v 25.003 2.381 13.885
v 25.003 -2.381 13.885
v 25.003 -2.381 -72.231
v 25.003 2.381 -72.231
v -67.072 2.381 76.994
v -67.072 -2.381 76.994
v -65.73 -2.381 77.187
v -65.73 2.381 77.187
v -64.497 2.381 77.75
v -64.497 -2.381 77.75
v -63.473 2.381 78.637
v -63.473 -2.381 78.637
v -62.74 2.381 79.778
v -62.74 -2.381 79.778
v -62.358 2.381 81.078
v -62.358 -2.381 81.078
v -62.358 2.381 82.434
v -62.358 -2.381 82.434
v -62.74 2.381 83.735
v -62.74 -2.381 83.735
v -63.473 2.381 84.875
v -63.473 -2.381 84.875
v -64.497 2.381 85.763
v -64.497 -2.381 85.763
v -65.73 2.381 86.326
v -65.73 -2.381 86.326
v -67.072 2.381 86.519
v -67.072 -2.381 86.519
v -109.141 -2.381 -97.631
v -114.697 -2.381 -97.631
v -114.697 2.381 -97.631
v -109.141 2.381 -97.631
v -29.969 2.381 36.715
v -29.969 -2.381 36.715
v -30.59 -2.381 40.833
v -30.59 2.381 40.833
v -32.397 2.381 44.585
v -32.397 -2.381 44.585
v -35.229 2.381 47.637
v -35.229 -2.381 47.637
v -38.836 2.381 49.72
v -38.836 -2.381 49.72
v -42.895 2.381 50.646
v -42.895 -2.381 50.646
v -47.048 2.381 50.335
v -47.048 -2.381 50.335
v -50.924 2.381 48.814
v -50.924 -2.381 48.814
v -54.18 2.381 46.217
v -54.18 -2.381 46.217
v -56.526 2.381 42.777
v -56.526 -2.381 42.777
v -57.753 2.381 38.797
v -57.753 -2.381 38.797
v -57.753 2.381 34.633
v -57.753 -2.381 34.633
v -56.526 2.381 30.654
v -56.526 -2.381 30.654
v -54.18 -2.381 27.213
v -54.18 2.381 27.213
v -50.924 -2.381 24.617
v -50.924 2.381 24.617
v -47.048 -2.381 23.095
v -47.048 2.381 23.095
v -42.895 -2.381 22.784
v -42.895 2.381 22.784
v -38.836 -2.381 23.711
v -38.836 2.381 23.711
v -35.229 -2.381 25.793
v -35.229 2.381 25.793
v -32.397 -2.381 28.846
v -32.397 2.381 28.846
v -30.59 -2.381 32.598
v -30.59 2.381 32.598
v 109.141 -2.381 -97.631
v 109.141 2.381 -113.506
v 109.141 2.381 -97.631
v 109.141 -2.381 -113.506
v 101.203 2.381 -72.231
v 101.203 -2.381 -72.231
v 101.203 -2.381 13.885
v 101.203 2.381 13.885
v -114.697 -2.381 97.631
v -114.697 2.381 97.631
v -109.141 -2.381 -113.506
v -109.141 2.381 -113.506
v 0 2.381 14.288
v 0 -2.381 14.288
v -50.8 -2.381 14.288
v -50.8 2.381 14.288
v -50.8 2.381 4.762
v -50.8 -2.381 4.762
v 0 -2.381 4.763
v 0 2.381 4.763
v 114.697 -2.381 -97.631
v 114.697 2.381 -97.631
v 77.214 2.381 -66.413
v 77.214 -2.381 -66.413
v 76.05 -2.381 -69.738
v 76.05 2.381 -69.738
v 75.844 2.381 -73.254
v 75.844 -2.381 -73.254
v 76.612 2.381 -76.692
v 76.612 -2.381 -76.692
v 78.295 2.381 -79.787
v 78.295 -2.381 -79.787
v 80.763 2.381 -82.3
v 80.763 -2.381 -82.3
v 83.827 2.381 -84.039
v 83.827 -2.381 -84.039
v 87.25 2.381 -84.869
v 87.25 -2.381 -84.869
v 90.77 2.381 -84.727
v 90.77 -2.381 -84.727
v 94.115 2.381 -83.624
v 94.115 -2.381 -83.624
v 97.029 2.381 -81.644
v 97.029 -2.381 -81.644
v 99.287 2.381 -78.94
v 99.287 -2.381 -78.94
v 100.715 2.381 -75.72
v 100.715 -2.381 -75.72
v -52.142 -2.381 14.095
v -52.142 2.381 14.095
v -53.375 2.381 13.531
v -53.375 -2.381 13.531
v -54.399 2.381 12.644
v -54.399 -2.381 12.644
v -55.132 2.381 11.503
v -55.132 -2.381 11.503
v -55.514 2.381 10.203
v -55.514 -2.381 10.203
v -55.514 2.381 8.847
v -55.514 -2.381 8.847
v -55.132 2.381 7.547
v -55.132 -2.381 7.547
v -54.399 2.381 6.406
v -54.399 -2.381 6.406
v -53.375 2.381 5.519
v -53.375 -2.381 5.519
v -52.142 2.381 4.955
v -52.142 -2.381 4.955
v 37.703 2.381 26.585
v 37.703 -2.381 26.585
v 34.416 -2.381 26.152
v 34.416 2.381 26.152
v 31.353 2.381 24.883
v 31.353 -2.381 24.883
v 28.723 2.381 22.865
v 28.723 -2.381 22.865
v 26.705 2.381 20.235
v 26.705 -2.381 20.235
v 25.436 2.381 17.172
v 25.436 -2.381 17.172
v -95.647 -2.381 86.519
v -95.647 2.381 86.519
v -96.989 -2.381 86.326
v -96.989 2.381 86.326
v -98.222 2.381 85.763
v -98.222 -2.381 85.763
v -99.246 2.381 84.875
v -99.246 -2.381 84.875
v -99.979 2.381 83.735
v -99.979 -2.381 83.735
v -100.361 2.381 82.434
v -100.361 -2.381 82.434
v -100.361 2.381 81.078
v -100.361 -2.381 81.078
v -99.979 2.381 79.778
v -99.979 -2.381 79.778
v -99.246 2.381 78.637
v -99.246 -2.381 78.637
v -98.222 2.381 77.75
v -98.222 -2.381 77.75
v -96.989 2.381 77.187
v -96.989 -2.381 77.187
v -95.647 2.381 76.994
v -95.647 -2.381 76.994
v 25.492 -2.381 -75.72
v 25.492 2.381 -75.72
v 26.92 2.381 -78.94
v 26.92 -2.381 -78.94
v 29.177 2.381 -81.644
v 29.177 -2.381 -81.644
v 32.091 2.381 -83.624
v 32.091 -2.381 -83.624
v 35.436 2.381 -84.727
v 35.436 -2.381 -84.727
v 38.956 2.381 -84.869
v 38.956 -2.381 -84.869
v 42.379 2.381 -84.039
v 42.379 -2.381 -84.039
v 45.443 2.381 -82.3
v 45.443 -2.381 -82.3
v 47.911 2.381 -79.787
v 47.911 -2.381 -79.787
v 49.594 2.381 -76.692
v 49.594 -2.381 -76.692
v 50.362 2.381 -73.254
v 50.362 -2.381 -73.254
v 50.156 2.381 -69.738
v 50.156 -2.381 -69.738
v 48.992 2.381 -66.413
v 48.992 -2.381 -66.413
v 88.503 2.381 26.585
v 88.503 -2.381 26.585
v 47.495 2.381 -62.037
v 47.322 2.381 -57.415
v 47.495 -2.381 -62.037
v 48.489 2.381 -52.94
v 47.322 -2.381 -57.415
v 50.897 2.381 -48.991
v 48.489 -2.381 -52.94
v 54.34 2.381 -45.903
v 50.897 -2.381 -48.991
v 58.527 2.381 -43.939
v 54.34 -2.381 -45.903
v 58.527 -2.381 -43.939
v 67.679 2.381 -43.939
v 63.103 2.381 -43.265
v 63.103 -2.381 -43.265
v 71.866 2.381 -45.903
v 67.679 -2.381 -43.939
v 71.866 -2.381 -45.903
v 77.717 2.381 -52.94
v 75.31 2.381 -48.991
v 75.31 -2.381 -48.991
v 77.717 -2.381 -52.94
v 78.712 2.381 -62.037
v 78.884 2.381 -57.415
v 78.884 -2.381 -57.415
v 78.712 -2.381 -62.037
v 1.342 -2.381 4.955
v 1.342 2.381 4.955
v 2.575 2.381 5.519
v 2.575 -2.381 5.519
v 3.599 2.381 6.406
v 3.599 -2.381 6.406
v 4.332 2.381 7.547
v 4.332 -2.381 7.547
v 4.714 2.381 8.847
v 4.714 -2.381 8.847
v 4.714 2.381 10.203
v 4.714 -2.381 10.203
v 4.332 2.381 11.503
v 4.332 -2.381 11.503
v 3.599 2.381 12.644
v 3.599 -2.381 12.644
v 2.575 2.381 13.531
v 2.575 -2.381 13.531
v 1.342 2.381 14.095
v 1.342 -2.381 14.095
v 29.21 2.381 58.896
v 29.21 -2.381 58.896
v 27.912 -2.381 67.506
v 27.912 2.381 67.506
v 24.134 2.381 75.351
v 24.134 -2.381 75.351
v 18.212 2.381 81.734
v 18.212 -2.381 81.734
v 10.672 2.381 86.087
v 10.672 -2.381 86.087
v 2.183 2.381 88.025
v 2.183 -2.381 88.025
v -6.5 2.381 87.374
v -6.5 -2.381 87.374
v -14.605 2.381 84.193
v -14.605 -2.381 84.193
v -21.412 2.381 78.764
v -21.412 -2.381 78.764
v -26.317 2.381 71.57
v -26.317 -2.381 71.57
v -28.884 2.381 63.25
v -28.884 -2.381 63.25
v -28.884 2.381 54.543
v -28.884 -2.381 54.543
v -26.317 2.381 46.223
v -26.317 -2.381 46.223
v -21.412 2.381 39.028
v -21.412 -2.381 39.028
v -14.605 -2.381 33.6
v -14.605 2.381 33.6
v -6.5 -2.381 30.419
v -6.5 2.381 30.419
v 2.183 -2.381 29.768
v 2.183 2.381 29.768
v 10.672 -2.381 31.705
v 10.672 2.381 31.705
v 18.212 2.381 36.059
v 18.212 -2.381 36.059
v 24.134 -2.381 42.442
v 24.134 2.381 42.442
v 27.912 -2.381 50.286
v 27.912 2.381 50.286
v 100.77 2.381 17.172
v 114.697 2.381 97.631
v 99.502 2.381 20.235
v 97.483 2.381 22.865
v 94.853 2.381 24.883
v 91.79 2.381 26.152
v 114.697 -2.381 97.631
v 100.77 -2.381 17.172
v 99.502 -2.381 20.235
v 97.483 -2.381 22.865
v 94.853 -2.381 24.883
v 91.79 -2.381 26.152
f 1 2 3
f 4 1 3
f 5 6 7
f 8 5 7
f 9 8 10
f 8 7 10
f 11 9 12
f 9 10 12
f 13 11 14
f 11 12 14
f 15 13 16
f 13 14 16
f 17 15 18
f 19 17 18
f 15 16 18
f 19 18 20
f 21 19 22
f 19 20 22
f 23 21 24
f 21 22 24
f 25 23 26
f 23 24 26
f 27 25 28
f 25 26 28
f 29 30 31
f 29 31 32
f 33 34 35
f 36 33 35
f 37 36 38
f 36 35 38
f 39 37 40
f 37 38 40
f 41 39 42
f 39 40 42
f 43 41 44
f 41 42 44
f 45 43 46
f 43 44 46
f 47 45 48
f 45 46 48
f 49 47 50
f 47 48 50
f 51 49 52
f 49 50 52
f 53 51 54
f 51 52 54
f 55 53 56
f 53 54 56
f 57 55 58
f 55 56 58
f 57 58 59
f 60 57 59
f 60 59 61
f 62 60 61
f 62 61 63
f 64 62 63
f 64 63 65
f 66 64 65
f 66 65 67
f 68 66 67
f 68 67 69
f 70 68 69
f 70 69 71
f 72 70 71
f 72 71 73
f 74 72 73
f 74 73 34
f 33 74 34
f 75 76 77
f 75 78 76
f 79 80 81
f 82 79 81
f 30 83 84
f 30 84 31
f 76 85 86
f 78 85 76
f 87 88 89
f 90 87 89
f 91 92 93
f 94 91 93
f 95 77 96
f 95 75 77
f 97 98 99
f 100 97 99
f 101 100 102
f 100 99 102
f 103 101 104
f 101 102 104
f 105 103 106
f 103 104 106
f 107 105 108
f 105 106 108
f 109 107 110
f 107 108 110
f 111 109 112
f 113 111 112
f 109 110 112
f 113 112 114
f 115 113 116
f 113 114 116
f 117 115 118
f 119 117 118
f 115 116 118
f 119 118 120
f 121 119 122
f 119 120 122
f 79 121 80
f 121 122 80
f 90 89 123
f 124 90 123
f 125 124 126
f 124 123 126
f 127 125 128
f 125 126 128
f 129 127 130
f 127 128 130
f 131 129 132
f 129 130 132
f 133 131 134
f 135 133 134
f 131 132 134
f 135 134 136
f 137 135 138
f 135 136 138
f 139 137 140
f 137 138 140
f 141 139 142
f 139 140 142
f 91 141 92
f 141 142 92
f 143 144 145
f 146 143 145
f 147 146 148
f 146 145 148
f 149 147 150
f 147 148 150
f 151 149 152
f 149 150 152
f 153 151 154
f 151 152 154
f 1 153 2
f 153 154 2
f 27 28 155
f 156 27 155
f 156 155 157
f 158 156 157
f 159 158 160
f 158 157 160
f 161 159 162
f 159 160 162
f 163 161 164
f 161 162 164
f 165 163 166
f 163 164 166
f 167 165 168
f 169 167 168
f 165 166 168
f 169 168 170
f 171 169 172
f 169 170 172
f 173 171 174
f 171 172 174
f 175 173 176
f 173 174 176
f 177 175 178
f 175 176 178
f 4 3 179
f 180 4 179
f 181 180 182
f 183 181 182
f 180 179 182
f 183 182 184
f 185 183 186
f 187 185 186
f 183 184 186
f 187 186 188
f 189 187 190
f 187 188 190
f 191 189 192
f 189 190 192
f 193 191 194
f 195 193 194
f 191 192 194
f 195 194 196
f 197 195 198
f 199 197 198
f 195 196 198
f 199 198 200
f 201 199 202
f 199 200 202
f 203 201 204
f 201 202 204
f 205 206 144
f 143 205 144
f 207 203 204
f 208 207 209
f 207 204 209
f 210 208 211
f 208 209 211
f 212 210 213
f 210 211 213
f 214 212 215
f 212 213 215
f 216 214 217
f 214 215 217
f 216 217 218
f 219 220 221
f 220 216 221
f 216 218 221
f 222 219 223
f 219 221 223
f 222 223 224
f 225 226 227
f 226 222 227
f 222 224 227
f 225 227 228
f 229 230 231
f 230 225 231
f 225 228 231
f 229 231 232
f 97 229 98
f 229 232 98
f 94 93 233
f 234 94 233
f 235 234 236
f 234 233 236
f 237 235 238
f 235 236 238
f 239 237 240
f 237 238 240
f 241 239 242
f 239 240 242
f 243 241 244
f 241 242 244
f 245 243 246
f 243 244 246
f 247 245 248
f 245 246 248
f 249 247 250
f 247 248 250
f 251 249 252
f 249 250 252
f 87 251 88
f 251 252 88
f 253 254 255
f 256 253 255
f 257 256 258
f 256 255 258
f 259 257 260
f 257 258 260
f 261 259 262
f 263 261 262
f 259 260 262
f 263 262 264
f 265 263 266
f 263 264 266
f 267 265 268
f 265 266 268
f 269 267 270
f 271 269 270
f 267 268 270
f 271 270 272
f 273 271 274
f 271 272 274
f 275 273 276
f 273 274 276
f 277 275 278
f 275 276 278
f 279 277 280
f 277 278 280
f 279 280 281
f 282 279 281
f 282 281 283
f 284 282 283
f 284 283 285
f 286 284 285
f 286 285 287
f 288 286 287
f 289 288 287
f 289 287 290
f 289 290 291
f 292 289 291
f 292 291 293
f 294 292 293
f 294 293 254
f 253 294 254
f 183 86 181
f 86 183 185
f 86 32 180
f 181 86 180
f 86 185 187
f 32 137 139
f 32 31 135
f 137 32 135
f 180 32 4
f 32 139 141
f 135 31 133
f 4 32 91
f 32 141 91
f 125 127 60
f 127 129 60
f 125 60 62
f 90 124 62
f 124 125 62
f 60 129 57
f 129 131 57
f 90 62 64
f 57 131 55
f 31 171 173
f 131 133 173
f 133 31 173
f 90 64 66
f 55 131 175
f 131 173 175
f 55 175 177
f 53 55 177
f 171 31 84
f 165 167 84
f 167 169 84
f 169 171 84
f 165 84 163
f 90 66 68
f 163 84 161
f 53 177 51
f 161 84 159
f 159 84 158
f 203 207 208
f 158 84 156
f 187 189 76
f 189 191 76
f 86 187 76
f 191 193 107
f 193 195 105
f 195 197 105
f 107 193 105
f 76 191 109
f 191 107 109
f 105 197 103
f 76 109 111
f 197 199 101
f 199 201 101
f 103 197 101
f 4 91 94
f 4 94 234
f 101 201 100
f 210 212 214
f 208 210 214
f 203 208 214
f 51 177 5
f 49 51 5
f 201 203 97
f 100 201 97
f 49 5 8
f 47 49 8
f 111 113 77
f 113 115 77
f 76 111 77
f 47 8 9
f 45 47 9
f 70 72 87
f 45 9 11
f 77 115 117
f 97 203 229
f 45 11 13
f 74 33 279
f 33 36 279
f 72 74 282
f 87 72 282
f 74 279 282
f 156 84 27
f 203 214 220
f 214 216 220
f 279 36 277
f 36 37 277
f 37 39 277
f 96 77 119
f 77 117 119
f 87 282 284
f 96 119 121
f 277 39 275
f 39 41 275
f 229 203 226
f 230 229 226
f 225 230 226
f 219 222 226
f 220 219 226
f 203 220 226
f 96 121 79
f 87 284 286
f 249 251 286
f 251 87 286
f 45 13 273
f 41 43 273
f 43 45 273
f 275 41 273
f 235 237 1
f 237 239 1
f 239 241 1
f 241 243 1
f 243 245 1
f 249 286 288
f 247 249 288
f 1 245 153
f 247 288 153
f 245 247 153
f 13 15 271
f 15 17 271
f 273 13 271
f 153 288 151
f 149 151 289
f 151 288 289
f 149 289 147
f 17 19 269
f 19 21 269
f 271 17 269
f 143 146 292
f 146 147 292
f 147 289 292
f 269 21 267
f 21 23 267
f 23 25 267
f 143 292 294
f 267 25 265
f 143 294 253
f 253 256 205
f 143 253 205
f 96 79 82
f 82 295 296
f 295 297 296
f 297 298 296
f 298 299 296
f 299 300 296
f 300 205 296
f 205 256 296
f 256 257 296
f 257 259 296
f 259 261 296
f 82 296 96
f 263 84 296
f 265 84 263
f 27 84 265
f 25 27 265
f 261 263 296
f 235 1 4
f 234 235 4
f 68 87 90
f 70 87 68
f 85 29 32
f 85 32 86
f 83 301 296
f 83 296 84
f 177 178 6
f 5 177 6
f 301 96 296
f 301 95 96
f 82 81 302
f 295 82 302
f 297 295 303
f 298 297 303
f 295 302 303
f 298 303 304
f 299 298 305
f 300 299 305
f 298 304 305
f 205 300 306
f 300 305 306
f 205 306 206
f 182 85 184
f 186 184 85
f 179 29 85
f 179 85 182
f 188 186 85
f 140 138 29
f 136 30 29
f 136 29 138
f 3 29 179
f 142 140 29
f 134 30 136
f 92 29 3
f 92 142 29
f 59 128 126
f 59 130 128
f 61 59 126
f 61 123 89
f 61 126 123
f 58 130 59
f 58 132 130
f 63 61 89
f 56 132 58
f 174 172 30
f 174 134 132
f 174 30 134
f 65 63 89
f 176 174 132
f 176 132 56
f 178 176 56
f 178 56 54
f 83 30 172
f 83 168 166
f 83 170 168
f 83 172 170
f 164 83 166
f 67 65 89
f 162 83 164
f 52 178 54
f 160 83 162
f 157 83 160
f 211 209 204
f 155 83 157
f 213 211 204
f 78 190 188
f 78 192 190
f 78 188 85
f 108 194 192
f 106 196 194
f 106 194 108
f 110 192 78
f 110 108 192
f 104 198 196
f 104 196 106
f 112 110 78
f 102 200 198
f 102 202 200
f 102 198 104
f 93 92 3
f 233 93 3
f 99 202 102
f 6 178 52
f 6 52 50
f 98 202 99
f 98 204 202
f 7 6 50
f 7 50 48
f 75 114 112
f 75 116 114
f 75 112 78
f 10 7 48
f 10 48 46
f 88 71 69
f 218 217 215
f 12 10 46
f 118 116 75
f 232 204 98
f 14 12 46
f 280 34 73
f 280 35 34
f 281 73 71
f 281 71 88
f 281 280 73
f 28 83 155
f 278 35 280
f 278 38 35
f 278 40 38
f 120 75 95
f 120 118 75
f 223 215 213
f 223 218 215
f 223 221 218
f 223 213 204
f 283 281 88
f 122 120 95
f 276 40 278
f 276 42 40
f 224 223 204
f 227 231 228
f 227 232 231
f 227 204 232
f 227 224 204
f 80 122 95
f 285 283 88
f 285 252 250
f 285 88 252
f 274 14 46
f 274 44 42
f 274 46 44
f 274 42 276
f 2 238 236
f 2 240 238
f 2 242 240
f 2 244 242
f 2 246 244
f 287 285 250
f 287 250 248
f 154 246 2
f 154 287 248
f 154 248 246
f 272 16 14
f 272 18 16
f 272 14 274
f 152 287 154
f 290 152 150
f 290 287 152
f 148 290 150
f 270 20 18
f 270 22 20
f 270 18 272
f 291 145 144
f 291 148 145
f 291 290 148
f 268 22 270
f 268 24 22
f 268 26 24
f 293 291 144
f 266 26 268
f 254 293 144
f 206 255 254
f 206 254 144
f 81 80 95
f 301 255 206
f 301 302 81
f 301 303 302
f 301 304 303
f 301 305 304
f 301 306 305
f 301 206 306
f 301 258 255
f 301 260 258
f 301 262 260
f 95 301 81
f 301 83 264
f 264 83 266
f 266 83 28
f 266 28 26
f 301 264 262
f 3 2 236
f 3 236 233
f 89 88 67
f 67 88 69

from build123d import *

# Parameters (mm, degrees)
F1_DEPTH = 2.38125
F3_DEPTH = 4.7635
F4_R     = 29.21
F5_DEPTH = 4.7635
F7_DEPTH = 4.7635
F8_R     = 13.97
F9_DEPTH = 4.7635


with BuildPart() as f1:
    # F0 (on Front) → F1 (new body, symmetric)
    with BuildSketch(Plane.XZ):
        Polygon((114.696875, -97.63125), (114.696875, 97.63125), (-114.696875, 97.63125), (-114.696875, -97.63125), (-109.140625, -97.63125), (-109.140625, -113.50625), (109.140625, -113.50625), (109.140625, -97.63125), align=None)
    extrude(amount=F1_DEPTH, both=True)

    # F2 (on face) → F3 (cut, through all)
    with BuildSketch(Plane.XZ.offset(2.38125)):
        with BuildLine():
            Line((25.003125, 13.88461), (25.003125, -72.23125))
            ThreePointArc((25.003125, -72.23125), (40.696544, -84.573432), (48.992014, -66.41309))
            ThreePointArc((48.992014, -66.41309), (63.103125, -43.26539), (77.214236, -66.41309))
            ThreePointArc((77.214236, -66.41309), (85.509706, -84.573432), (101.203125, -72.23125))
            Line((101.203125, -72.23125), (101.203125, 13.88461))
            ThreePointArc((101.203125, 13.88461), (97.483381, 22.864866), (88.503125, 26.58461))
            Line((88.503125, 26.58461), (37.703125, 26.58461))
            ThreePointArc((37.703125, 26.58461), (28.722869, 22.864866), (25.003125, 13.88461))
        make_face()
    extrude(amount=-F3_DEPTH, mode=Mode.SUBTRACT)

    # F4 (on face) → F5 (cut, through all)
    with BuildSketch(Plane.XZ.offset(2.38125)):
        with Locations((0, 58.89625)):
            Circle(F4_R)
    extrude(amount=-F5_DEPTH, mode=Mode.SUBTRACT)

    # F6 (on face) → F7 (cut, through all)
    with BuildSketch(Plane.XZ.offset(2.38125)):
        with BuildLine():
            ThreePointArc((-50.8, 14.2875), (-55.5625, 9.525), (-50.8, 4.7625))
            Line((-50.8, 4.7625), (0, 4.7625))
            ThreePointArc((0, 4.7625), (4.7625, 9.525), (0, 14.2875))
            Line((0, 14.2875), (-50.8, 14.2875))
        make_face()
        with BuildLine():
            Line((-67.071875, 86.51875), (-95.646875, 86.51875))
            ThreePointArc((-95.646875, 86.51875), (-100.409375, 81.75625), (-95.646875, 76.99375))
            Line((-95.646875, 76.99375), (-67.071875, 76.99375))
            ThreePointArc((-67.071875, 76.99375), (-62.309375, 81.75625), (-67.071875, 86.51875))
        make_face()
    extrude(amount=-F7_DEPTH, mode=Mode.SUBTRACT)

    # F8 (on face) → F9 (cut, through all)
    with BuildSketch(Plane.XZ.offset(2.38125)):
        with Locations((-43.939427, 36.715232)):
            Circle(F8_R)
    extrude(amount=-F9_DEPTH, mode=Mode.SUBTRACT)


solid = f1.part
